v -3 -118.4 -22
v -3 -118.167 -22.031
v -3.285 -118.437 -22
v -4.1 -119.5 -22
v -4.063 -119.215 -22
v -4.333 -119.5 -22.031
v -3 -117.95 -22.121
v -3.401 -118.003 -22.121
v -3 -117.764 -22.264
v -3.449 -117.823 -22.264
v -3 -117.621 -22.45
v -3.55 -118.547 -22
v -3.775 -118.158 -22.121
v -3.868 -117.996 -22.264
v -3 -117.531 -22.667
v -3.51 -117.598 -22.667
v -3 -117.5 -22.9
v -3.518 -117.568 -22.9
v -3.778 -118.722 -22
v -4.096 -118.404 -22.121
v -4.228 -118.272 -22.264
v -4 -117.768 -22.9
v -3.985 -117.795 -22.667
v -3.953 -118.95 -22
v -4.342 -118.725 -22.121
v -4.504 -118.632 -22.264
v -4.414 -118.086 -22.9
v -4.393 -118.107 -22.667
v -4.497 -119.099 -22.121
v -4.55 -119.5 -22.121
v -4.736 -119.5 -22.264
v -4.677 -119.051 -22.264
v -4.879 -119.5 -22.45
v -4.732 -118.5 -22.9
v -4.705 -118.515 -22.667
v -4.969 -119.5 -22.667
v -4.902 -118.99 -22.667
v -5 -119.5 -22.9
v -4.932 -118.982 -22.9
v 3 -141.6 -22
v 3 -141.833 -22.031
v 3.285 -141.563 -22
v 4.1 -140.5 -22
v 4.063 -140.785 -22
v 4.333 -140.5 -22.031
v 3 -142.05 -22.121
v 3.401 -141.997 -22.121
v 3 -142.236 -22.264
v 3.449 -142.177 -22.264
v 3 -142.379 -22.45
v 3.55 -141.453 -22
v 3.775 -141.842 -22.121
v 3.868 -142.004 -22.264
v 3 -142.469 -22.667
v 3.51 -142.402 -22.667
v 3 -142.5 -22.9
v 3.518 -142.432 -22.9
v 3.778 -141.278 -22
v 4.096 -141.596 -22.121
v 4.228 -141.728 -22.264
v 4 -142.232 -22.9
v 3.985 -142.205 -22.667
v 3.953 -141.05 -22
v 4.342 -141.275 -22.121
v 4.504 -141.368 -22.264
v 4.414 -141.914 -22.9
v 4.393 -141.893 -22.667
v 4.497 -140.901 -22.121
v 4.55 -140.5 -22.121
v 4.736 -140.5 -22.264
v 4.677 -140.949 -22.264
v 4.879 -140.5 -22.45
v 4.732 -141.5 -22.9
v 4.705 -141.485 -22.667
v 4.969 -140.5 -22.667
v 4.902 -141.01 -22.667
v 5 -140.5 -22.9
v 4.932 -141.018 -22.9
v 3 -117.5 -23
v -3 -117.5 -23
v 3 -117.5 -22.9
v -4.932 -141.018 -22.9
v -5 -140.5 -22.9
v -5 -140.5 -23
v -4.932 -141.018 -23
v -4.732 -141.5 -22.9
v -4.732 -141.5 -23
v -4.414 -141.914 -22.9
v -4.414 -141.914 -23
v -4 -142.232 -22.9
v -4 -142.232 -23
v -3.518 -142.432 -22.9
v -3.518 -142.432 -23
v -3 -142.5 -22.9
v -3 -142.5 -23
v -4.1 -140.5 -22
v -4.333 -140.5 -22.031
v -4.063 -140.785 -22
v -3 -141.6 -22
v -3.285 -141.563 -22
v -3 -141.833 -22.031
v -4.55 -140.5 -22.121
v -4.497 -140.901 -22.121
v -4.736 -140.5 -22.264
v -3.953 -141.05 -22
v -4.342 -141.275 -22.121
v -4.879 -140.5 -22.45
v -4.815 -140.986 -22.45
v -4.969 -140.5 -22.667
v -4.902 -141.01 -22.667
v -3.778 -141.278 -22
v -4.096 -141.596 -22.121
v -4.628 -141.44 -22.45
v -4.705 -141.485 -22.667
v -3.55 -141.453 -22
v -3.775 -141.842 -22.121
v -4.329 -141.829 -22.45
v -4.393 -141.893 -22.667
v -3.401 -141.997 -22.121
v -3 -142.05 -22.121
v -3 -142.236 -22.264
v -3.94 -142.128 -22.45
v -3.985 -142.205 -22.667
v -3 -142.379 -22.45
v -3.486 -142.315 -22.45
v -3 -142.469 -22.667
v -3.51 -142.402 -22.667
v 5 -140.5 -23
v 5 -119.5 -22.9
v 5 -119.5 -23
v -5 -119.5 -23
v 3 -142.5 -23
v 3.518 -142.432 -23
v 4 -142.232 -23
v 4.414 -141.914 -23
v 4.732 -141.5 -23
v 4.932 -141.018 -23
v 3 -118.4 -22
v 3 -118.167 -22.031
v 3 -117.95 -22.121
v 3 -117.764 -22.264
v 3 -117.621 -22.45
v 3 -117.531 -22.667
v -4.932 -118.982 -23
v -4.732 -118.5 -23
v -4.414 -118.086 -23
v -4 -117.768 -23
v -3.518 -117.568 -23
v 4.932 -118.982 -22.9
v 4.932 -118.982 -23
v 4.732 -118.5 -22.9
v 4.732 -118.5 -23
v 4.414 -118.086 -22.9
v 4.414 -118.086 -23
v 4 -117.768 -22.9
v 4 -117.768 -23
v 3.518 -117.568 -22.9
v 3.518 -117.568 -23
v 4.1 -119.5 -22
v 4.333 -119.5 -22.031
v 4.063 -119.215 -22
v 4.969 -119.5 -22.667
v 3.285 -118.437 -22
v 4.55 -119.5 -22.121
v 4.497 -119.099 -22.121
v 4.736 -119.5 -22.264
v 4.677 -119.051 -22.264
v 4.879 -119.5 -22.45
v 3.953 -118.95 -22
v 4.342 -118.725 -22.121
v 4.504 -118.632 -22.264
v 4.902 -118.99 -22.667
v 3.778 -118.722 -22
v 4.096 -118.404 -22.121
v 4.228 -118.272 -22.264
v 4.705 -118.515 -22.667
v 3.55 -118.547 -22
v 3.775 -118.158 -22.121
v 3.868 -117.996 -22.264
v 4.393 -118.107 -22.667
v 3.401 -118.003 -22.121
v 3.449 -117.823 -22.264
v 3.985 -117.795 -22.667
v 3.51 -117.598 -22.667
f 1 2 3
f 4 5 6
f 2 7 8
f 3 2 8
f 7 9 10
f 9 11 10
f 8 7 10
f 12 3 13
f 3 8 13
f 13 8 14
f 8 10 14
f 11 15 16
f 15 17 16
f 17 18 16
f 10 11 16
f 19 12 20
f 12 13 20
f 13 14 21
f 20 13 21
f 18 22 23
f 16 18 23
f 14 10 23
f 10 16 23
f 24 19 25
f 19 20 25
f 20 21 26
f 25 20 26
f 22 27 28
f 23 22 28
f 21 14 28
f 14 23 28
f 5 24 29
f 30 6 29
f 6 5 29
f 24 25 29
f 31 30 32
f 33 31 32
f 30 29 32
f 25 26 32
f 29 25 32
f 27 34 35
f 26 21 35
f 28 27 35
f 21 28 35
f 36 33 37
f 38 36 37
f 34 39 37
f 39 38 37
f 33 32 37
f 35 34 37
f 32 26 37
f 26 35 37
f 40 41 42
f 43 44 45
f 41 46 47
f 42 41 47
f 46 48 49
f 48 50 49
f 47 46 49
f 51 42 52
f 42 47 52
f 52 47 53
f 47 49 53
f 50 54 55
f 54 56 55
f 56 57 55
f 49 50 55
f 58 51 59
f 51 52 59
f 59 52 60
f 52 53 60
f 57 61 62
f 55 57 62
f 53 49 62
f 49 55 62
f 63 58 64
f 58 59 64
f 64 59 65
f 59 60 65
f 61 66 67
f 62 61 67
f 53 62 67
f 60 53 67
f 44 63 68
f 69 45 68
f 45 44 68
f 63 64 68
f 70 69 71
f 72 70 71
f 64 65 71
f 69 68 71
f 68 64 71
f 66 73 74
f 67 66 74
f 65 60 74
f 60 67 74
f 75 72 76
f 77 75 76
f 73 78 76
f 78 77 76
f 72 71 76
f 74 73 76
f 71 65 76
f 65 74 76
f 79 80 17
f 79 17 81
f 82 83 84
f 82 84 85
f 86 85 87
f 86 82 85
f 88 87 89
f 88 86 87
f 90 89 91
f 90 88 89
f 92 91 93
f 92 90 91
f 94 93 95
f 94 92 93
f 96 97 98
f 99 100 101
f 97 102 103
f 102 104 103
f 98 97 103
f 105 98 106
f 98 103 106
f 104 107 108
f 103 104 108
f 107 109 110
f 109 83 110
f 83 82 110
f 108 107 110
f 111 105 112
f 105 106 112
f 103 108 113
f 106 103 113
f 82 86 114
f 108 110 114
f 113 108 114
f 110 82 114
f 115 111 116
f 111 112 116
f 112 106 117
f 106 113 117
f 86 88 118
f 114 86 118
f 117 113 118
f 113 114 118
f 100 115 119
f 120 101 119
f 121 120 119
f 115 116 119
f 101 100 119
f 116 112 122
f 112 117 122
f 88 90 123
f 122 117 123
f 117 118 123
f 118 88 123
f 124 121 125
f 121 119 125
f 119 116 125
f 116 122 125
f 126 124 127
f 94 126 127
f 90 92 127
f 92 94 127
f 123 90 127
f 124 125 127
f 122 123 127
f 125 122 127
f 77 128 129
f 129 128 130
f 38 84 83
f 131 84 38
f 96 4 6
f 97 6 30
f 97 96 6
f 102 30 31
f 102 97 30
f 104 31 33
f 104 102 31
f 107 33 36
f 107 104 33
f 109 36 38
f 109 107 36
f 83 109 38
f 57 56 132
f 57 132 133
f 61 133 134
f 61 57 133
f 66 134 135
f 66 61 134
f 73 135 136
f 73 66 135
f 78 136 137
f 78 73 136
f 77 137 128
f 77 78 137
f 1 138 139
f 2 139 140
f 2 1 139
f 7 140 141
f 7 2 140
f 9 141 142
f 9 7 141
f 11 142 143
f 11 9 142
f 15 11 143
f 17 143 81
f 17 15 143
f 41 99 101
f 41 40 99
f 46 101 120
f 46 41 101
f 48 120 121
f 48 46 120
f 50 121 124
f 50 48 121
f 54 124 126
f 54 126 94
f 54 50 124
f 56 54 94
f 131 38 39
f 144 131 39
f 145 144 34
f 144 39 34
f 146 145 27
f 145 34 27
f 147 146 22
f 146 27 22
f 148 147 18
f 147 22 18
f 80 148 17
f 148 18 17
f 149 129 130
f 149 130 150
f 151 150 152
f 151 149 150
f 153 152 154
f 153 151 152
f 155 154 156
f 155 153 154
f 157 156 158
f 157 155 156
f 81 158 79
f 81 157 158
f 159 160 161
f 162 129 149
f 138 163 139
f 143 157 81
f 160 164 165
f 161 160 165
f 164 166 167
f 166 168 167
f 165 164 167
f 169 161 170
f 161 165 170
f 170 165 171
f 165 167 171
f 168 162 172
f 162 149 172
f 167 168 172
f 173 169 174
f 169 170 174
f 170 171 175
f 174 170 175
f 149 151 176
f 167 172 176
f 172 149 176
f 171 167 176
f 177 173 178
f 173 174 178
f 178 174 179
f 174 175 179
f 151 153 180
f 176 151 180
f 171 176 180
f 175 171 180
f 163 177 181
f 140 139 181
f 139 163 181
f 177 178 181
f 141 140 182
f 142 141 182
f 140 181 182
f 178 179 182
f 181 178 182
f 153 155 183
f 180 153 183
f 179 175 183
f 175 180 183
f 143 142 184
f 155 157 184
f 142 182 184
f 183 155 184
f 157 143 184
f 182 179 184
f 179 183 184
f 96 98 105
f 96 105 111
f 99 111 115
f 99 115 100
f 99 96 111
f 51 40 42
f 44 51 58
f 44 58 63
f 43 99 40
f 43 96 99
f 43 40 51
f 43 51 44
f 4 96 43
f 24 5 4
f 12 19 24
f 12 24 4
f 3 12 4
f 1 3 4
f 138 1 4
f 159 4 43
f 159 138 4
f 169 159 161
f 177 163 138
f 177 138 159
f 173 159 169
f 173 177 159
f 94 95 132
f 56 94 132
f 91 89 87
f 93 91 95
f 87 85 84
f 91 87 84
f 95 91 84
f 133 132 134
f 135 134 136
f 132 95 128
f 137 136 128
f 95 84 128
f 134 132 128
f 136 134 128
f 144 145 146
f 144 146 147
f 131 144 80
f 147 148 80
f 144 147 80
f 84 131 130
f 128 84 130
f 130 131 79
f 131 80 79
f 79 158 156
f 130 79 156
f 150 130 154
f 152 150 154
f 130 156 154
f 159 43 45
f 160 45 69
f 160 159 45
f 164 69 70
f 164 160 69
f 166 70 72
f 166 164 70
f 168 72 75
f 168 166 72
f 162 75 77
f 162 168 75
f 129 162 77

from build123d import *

# Parameters (mm, degrees)
SKETCH028_W  = 10
SKETCH028_H  = 25
PAD015_DEPTH = 1
FILLET021_R  = 2
FILLET022_R  = 0.9


with BuildPart() as part:
    # Sketch028 → Pad015 (new body)
    with BuildSketch(Plane.XY):
        Rectangle(SKETCH028_W, SKETCH028_H)
    extrude(amount=PAD015_DEPTH)

    # Fillet021
    fillet021_edges = [part.edges().sort_by_distance(p)[0] for p in [
        (-5, -12.5, 0.5),
        (-5, 12.5, 0.5),
        (5, -12.5, 0.5),
        (5, 12.5, 0.5),
    ]]
    fillet(fillet021_edges, radius=FILLET021_R)

    # Fillet022
    fillet022_edges = [part.edges().sort_by_distance(p)[0] for p in [
        (0, -12.5, 1),
        (5, 0, 1),
        (-5, 0, 1),
        (0, 12.5, 1),
    ]]
    fillet(fillet022_edges, radius=FILLET022_R)


with BuildPart() as part_1:
    # Body007 placement: moved
    add(part.part.moved(Location((0, -130, -23))))


solid = part_1.part
